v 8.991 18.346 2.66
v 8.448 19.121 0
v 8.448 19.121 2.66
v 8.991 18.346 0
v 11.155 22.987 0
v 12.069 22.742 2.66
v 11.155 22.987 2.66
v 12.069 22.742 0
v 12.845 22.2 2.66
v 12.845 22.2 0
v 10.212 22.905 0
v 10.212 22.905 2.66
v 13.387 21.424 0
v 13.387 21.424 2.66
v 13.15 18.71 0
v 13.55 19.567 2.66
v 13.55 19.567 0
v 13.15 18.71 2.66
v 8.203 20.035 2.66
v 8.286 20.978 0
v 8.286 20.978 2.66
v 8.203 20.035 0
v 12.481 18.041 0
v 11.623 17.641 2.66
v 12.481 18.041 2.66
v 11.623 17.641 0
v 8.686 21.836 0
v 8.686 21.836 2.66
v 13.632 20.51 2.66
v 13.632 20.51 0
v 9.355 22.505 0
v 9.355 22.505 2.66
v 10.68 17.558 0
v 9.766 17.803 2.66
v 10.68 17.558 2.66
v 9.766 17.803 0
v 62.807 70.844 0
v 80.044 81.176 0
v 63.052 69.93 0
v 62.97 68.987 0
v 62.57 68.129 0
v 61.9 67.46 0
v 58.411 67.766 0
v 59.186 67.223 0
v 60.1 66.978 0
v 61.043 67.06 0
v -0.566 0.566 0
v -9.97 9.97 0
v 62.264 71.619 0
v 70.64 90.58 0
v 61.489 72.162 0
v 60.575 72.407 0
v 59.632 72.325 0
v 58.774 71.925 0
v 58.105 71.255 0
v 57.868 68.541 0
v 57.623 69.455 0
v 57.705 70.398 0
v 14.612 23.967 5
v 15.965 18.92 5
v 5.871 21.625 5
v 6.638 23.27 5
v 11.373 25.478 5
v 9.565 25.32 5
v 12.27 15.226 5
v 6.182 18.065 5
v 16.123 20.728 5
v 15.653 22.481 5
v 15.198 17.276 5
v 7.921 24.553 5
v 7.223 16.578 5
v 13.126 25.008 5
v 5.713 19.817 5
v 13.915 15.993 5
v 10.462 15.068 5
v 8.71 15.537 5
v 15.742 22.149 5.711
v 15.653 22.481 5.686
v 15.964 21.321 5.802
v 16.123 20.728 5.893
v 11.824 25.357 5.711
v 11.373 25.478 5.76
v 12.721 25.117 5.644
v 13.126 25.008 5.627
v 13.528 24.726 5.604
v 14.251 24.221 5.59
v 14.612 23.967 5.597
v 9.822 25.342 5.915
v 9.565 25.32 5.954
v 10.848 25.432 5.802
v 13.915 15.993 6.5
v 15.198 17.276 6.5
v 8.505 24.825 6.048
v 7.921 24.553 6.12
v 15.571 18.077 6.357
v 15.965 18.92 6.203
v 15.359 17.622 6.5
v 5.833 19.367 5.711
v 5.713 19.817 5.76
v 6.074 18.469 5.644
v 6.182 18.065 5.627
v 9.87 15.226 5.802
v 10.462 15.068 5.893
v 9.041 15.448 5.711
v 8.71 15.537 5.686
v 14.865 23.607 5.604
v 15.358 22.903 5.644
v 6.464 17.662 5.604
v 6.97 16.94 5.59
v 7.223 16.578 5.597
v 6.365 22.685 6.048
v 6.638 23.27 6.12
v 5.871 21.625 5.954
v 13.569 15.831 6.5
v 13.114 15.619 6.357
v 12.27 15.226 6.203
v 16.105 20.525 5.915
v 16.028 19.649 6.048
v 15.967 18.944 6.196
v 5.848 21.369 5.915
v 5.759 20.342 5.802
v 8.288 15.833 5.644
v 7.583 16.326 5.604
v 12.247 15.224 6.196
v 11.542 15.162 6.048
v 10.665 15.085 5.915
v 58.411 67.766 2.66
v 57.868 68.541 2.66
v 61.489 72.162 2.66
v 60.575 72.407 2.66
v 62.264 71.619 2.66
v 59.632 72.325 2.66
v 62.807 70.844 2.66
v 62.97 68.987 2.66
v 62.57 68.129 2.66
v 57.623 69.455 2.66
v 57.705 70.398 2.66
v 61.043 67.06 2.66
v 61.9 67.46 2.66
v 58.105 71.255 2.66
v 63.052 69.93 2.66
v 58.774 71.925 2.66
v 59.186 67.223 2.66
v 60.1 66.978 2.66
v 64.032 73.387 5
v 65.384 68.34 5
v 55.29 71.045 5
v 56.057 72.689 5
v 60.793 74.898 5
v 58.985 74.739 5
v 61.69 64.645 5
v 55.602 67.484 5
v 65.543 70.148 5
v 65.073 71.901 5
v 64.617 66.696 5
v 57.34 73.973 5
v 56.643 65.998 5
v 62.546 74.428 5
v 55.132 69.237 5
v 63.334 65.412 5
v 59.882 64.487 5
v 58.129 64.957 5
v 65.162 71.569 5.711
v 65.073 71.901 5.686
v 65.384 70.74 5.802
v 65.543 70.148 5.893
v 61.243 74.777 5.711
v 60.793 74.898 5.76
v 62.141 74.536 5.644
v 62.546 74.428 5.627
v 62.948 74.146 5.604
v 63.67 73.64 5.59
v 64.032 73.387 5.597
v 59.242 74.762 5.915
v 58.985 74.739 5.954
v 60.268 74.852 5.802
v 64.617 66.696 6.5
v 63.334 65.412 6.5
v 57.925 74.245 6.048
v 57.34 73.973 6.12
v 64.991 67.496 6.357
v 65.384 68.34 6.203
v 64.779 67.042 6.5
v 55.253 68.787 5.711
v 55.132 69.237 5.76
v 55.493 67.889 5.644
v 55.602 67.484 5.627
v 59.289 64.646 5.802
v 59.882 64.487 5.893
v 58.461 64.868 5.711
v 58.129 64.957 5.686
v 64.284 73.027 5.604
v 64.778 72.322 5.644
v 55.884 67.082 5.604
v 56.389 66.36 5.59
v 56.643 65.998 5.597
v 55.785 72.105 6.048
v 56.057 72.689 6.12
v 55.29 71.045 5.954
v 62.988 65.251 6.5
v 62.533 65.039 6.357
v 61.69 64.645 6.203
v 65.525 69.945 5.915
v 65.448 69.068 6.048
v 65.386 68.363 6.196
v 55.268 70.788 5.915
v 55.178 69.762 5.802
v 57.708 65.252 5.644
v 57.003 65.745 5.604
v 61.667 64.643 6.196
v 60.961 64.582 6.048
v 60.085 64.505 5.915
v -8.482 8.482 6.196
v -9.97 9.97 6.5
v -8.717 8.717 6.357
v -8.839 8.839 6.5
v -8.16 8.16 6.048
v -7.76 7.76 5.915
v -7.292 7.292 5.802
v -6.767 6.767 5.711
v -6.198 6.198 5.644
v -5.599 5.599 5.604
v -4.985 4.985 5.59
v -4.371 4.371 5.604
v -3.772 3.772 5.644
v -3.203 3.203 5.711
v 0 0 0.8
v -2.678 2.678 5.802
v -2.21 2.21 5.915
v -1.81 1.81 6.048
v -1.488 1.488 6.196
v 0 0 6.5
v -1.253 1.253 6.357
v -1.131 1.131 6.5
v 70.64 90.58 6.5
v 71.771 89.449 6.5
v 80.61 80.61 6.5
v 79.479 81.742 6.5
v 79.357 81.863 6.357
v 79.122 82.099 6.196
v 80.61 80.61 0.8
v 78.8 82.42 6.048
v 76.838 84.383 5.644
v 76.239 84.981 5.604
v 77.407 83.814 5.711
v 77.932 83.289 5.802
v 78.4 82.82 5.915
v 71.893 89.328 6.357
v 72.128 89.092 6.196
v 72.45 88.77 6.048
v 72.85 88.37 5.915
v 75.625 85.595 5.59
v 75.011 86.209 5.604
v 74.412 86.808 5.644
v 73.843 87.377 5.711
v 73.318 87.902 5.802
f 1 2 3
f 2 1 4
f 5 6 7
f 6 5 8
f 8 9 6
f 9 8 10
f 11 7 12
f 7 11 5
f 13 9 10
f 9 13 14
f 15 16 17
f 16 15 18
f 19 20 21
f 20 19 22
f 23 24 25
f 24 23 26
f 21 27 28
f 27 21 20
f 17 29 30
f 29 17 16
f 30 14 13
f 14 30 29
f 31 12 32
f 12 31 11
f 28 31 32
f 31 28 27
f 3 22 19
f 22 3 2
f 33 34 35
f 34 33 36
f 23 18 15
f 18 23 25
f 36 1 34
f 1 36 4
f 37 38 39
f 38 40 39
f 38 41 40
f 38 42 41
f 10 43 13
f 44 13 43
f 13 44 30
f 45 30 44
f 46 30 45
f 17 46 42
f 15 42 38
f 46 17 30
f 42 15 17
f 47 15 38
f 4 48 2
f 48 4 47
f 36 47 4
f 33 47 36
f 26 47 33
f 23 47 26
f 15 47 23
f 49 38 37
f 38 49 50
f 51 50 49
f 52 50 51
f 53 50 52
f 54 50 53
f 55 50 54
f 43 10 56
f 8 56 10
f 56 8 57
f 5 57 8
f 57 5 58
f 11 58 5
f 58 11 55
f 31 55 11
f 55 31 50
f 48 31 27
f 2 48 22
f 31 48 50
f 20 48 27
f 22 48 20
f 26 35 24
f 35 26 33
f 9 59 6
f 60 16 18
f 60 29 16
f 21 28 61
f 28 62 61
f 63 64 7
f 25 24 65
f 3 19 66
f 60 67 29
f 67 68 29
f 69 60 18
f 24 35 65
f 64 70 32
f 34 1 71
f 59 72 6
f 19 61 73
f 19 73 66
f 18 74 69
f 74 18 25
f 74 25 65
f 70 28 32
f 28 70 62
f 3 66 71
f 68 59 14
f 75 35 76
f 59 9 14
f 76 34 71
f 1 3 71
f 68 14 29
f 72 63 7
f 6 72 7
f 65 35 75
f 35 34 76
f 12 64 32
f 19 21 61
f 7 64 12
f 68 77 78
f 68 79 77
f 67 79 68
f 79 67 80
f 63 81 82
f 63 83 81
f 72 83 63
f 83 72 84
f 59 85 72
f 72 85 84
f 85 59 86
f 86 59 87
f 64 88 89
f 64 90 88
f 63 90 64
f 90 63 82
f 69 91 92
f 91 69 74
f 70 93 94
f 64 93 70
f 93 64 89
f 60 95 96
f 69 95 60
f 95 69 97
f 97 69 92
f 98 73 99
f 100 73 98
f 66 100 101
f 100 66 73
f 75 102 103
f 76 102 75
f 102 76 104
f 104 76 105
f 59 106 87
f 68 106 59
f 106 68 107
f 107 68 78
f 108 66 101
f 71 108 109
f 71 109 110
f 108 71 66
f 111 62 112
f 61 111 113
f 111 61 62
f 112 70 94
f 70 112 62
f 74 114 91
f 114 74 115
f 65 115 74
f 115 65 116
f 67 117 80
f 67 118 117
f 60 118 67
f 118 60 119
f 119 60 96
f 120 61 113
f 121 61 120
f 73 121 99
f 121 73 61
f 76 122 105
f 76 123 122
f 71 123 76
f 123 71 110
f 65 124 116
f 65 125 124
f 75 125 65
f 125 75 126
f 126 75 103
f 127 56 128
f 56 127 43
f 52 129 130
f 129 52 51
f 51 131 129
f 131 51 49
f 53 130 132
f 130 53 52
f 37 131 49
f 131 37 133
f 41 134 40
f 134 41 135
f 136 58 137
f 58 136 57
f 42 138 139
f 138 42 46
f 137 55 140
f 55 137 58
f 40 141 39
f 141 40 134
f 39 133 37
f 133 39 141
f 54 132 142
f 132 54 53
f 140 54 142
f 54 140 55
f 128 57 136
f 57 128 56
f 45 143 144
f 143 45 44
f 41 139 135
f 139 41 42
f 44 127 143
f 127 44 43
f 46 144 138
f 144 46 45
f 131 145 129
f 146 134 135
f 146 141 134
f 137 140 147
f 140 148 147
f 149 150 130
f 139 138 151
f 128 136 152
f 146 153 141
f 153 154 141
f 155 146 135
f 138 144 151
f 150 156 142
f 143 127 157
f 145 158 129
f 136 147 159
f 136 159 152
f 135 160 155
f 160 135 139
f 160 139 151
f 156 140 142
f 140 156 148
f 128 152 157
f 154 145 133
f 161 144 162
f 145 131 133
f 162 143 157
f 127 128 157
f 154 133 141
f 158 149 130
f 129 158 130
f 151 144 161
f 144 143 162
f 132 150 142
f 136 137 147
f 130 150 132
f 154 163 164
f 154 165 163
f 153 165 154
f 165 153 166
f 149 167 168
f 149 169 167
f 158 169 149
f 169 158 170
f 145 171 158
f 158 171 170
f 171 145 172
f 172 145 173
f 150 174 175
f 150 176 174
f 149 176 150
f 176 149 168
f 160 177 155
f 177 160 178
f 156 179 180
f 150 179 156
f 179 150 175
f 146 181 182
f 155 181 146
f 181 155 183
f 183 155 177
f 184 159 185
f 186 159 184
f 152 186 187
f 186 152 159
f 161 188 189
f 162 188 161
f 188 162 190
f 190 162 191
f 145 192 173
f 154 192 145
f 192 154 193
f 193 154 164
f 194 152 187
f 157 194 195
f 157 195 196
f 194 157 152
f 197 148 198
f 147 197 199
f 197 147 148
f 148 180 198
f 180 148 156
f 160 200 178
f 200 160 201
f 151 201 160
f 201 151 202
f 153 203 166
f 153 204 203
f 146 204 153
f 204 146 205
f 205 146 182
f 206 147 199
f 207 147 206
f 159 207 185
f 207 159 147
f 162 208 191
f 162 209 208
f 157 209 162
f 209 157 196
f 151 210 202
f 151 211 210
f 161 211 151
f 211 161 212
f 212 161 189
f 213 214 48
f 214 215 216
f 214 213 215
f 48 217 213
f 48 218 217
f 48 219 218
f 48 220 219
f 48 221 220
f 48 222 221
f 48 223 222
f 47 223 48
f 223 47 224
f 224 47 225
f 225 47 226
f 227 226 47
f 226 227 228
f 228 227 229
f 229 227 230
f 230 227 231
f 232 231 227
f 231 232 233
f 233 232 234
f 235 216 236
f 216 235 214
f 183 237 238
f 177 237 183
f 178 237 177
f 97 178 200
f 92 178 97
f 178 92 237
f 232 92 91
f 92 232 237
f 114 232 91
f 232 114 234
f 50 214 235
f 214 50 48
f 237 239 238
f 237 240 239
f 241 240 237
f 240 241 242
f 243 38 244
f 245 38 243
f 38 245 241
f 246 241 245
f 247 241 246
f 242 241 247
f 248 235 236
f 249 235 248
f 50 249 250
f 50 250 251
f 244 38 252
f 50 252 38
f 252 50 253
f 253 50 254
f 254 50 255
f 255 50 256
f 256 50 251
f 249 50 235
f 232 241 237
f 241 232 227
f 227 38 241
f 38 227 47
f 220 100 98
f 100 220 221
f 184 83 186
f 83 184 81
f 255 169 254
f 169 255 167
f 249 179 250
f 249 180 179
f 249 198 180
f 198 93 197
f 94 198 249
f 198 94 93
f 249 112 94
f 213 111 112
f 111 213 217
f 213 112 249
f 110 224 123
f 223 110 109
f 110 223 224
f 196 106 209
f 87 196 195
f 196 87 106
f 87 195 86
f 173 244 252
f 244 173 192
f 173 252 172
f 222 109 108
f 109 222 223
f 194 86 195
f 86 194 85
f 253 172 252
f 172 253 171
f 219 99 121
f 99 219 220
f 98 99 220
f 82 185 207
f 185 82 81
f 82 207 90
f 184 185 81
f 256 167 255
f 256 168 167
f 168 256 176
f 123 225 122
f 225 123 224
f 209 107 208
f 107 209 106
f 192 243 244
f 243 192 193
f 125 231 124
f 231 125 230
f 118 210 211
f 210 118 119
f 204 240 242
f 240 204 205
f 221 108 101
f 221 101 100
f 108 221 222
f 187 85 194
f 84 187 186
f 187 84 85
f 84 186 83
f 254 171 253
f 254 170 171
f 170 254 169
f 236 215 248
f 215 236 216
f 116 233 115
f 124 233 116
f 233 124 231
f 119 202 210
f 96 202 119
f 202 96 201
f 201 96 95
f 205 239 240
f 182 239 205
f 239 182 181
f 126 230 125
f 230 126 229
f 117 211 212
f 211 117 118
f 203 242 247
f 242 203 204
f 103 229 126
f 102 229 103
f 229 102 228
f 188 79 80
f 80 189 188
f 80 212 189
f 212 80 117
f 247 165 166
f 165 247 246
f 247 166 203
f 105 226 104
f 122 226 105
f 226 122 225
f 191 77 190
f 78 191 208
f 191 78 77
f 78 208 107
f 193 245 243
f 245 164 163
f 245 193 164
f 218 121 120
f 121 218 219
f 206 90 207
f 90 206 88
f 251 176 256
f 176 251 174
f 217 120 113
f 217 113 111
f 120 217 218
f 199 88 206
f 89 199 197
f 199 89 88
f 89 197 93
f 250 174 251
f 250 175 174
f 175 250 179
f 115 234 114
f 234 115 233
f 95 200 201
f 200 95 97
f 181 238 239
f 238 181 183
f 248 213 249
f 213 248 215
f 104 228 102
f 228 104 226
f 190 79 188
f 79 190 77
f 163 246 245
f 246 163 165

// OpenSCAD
bar_width = 114;
bar_depth = 6.5;   // normal is ~5
bar_heigh = 14.1;

screw_r1 = 5.45/2;
screw_h1 = 2.66;
screw_r2 = 10.45/2;
screw_h2 = 5-2.66;

screw_offx = 19.33+5.45/2;
screw_offy = 3.89+5.45/2;

chopsize = 1;


// the main bar
rotate([0,0,45])
difference()
{
    // the bar (base)
    linear_extrude(height=bar_depth)
        square([bar_width,bar_heigh]);

    // cutout the screw holes
    for(i=[screw_offx, bar_width-screw_offx]) translate([i,screw_offy,0]) union()
    {
        cylinder(h=screw_h1+0.1, r=screw_r1, $fn=18);
        translate([0,0,screw_h1]) cylinder(h=screw_h2, r1=screw_r1, r2=screw_r2, $fn=18);
        translate([0,0,screw_h1+screw_h2])
            cylinder(h=bar_heigh-screw_h2-screw_h1+0.1, r=screw_r2, $fn=18);
    }

    // cutout the bottom rounded area
    translate([-0.1,-0.1,-0.1])
    rotate([0,90,0]) rotate([0,0,90]) linear_extrude(height=bar_width+0.2)
        polygon(points=[[0,0], [0,chopsize], [chopsize,0]], paths=[[0,1,2]]);

    // round off the top
    translate([-0.1,bar_heigh/2,bar_depth+0.2]) rotate([0,90,0]) scale([0.2,1,1])
        cylinder(h=bar_width+0.2, r=(bar_heigh-3)/2, $fn=40);
}
